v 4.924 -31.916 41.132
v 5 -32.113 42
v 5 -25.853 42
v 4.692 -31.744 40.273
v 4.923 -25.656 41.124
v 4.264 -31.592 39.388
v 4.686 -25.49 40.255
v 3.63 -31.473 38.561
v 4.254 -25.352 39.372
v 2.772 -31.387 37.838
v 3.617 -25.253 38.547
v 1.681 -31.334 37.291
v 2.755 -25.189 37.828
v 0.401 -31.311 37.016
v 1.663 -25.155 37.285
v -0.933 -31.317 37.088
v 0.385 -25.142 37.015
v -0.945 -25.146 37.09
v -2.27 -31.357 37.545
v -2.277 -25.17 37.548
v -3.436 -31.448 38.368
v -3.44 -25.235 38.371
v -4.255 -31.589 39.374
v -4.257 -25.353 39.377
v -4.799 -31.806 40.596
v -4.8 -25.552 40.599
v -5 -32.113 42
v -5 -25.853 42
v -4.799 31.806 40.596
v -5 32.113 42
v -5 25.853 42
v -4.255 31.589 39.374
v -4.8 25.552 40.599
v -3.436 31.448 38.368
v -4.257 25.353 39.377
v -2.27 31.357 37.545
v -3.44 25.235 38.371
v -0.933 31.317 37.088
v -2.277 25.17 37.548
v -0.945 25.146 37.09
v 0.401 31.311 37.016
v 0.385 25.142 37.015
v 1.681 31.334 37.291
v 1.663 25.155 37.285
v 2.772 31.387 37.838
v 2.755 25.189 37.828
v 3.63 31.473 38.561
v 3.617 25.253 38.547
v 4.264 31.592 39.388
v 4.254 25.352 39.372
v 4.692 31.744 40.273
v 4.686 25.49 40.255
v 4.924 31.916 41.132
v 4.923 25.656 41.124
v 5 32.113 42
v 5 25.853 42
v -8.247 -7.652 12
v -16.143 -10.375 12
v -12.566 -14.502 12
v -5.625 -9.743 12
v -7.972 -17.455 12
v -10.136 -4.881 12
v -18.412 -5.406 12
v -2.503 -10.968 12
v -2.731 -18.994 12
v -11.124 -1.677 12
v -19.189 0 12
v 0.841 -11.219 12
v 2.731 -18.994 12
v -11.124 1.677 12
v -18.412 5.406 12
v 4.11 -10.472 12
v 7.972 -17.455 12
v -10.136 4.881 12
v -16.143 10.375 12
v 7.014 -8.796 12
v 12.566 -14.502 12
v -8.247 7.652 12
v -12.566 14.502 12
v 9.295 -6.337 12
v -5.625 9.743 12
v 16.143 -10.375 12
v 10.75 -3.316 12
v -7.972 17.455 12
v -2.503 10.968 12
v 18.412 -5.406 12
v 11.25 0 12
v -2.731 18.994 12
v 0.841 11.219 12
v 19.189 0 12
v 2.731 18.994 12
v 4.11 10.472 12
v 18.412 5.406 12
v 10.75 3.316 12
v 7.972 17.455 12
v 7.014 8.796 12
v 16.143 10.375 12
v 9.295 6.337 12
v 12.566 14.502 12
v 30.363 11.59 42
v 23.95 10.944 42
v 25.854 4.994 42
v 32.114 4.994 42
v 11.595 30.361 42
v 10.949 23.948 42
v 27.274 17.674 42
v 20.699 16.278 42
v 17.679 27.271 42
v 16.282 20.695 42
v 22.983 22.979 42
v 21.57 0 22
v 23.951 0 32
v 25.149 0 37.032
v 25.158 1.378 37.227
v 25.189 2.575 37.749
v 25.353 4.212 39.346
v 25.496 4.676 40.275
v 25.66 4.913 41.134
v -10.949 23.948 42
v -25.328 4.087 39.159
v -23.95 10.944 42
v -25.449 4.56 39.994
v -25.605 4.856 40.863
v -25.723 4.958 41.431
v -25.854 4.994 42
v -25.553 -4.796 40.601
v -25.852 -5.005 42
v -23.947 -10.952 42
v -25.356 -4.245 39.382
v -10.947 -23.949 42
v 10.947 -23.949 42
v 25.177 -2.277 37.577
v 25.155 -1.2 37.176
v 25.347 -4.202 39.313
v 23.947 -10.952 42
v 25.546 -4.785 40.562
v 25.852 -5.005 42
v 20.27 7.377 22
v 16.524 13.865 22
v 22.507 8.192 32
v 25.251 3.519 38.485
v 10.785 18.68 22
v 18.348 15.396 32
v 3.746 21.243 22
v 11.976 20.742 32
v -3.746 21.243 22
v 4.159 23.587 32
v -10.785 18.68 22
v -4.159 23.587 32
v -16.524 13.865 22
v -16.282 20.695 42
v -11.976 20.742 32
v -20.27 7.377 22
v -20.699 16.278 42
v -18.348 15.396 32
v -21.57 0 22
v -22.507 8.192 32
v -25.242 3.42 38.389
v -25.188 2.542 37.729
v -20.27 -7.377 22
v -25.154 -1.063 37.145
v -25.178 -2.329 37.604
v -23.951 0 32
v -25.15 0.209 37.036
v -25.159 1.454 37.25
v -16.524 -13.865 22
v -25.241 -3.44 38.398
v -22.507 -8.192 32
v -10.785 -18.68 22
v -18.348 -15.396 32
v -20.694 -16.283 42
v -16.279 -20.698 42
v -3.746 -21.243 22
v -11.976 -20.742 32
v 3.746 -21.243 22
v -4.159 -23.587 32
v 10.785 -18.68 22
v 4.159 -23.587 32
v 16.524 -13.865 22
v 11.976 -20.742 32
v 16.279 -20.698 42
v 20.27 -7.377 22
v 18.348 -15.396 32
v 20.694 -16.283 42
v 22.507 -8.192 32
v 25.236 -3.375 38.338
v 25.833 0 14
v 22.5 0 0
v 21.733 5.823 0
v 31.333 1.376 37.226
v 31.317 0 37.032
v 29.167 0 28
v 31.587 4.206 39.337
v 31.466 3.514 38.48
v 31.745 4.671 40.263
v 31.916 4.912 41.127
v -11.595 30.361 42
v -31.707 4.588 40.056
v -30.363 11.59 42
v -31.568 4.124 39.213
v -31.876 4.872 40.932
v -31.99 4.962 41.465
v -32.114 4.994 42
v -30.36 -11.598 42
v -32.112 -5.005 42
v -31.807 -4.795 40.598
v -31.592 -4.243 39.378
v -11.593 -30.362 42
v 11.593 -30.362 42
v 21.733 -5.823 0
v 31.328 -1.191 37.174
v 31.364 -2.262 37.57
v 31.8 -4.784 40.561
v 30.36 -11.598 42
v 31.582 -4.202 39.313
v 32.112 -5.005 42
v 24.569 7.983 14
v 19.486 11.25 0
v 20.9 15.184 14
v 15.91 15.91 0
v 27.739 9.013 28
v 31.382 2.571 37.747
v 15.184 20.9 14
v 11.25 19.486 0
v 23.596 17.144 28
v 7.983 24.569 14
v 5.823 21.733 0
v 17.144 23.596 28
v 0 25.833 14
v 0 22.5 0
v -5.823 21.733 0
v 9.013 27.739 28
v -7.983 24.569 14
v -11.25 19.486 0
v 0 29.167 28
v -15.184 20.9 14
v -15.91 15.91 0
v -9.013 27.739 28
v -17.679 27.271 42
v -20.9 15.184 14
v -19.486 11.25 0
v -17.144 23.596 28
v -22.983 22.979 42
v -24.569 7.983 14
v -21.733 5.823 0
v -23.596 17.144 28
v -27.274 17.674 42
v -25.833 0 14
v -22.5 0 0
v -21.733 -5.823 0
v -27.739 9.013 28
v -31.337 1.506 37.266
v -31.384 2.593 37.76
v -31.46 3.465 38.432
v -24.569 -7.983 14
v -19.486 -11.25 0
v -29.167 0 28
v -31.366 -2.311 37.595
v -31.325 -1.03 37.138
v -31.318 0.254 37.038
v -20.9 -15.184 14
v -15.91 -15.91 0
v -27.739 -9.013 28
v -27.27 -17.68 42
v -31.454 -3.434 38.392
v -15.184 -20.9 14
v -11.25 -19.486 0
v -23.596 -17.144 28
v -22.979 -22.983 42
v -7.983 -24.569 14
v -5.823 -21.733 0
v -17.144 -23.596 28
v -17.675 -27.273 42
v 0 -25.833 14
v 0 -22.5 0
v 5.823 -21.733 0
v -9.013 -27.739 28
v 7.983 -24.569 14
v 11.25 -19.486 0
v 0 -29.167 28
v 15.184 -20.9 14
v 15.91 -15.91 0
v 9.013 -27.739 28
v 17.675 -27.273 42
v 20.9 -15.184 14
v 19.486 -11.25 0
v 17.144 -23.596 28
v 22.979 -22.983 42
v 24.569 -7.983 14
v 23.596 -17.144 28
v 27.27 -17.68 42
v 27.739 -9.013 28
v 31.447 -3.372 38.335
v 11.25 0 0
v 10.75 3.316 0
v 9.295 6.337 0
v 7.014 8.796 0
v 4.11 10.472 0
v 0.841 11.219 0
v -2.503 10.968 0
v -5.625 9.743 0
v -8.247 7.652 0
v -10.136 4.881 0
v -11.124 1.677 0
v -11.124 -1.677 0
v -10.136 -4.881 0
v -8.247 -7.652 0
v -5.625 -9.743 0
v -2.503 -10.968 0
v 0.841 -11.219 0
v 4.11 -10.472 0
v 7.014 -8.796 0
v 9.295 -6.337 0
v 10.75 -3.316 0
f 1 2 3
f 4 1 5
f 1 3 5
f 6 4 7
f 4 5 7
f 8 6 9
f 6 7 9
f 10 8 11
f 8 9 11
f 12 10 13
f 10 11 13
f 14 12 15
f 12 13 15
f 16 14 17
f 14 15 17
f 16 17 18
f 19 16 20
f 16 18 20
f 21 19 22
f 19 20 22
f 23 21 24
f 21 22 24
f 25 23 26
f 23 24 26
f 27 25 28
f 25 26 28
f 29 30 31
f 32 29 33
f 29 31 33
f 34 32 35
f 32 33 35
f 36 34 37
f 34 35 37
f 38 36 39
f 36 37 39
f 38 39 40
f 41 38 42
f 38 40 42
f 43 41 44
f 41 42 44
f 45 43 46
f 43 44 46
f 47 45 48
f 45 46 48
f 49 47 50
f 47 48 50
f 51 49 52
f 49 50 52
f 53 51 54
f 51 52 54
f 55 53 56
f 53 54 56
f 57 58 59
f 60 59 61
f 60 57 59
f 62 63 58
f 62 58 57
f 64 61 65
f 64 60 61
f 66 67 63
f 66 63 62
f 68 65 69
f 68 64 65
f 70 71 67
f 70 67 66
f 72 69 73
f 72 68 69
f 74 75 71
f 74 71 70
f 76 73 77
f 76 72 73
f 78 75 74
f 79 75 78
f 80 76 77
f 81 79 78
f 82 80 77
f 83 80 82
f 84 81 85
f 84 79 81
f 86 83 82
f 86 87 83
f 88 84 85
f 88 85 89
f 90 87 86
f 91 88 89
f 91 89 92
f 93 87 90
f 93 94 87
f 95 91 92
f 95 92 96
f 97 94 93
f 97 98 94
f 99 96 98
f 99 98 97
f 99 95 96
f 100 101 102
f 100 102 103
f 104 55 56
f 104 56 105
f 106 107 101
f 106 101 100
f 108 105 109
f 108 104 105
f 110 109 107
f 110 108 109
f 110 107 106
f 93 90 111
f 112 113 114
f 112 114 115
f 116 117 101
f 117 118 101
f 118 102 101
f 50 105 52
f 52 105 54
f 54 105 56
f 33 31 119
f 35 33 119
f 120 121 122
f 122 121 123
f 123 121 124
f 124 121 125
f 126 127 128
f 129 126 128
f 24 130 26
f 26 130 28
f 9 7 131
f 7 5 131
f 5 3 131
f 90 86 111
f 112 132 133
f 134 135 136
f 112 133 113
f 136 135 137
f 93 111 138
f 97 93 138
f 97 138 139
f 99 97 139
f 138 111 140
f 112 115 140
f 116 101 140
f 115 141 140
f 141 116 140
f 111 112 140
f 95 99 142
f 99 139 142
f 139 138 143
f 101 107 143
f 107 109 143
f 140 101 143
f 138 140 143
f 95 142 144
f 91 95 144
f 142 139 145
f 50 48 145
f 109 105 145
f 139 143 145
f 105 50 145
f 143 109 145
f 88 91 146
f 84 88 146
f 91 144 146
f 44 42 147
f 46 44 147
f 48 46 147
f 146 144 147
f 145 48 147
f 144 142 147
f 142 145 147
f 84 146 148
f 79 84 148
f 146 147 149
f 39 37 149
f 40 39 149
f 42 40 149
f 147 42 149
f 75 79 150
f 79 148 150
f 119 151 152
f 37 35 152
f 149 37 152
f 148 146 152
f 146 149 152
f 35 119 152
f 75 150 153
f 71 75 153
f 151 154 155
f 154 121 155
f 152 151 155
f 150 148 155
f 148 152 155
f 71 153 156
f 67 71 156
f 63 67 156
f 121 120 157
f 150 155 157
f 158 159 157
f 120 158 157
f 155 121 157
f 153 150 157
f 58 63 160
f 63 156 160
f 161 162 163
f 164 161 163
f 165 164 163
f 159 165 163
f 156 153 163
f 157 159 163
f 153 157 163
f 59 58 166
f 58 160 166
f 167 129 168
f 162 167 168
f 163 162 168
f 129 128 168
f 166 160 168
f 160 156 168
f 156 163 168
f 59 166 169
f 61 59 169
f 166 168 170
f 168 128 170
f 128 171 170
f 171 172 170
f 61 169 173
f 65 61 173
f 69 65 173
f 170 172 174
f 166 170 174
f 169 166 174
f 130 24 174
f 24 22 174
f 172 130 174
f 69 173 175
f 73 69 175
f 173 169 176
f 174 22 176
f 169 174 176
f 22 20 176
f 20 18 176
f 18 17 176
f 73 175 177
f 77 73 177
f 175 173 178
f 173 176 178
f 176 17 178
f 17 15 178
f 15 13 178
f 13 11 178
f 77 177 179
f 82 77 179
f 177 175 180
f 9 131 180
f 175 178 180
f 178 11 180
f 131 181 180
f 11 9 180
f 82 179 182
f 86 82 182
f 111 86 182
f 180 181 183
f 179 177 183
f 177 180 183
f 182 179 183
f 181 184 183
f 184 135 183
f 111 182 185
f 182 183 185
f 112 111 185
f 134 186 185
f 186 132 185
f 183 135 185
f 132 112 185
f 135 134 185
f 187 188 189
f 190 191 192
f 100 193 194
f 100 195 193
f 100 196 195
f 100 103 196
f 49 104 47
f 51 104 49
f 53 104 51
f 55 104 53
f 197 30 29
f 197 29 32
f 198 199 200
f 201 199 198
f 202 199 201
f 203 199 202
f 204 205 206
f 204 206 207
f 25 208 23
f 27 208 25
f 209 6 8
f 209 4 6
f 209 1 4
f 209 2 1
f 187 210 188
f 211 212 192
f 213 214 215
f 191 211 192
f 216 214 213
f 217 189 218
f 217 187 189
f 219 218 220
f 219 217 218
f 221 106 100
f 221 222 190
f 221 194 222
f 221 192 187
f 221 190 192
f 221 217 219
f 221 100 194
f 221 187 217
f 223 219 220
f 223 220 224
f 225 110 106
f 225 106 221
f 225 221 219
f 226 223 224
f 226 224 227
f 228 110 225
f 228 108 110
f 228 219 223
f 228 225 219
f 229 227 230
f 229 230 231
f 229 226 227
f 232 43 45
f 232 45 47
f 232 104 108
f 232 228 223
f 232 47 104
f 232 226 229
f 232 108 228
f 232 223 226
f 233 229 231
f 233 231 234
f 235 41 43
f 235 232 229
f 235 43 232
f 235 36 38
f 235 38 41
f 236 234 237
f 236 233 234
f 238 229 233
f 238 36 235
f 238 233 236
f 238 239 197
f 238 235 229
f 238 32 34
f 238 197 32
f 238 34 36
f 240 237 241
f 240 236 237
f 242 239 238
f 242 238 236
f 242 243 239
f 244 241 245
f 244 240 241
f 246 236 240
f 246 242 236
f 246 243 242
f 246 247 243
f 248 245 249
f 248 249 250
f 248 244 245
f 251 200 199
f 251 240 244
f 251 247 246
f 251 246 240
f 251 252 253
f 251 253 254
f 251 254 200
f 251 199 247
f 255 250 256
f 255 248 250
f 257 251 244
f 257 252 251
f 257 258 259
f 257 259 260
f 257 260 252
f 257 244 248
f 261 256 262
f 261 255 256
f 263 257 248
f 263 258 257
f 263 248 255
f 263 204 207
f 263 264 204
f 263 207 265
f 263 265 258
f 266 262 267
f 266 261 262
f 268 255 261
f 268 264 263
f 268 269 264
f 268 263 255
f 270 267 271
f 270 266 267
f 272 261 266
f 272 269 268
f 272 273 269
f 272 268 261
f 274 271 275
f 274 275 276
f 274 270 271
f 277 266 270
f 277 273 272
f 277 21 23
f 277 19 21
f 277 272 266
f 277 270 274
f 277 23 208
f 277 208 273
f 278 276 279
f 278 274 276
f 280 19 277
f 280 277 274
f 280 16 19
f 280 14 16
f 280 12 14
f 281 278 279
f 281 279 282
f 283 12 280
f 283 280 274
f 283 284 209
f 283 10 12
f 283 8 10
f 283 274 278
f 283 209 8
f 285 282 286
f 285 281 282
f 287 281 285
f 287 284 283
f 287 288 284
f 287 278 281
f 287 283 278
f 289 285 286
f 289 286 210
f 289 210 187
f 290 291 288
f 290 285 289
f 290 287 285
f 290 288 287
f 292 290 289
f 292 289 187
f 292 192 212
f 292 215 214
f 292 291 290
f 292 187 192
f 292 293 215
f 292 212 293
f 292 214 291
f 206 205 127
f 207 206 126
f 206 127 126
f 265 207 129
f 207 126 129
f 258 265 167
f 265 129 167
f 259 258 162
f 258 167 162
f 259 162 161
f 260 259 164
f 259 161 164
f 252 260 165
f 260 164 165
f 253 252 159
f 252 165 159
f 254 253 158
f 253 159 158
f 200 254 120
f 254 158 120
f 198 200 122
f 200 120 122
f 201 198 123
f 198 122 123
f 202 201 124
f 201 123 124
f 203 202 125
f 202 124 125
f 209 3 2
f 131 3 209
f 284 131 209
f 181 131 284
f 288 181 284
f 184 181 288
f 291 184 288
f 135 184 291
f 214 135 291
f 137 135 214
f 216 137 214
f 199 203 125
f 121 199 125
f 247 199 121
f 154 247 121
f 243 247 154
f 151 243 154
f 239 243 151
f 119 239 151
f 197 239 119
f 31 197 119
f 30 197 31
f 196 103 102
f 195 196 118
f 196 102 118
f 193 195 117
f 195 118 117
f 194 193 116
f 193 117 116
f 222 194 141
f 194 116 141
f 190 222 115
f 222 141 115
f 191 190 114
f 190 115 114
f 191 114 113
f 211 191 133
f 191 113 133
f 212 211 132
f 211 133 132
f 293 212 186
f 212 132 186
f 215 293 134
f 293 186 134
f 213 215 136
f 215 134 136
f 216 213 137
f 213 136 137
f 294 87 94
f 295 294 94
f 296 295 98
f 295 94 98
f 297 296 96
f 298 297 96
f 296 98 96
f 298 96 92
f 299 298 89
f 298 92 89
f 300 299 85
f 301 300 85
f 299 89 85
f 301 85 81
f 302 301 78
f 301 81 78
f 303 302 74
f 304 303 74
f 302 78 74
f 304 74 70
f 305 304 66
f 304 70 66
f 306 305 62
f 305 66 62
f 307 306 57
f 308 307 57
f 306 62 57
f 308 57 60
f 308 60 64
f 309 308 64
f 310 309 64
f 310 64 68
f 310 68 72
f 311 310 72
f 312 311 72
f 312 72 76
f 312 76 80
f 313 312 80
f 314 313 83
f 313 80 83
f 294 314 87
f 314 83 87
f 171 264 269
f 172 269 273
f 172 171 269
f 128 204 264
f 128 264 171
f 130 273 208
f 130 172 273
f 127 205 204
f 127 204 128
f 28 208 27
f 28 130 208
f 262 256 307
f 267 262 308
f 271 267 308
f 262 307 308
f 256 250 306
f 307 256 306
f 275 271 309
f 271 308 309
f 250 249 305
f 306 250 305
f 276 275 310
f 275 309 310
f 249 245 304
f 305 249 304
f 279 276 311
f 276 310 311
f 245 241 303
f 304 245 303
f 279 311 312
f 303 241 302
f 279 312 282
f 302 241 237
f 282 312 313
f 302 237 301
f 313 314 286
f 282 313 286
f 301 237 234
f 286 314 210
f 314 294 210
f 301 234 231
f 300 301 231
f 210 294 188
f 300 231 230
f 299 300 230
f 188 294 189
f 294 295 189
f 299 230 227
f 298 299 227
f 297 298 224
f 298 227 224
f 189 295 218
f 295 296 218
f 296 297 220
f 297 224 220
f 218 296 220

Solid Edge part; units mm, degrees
sketch "Sketch1" plane through (0, 0, 0) normal (0, -1, 0) x (1, 0, 0)
  line L0 (22.5, 0) -> (32.5, 42)
  line L1 (26.3323, 42) -> (32.5, 42)
  line L2 (19.1894, 12) -> (26.3323, 42)
  line L3 (11.25, 12) -> (19.1894, 12)
  line L4 (11.25, 0) -> (11.25, 12)
  line L5 (11.25, 0) -> (22.5, 0)
revolve "RevolvedProtrusion1" add sketch "Sketch1" angle 360 about axis through (0, 0, 0) along (0, 0, 1)
sketch "Sketch2" plane through (0, 0, 0) normal (0, -1, 0) x (1, 0, 0)
  circle A0 centre (0, 42) radius 5
extrude "Cutout1" cut sketch "Sketch2" along normal through all and the other way through all
sketch "Sketch3" plane through (0, 0, 0) normal (1, 0, 0) x (0, 1, 0)
  circle A0 centre (-0.0054, 42.0317) radius 5
extrude "Cutout2" cut sketch "Sketch3" along normal through all and the other way through all
